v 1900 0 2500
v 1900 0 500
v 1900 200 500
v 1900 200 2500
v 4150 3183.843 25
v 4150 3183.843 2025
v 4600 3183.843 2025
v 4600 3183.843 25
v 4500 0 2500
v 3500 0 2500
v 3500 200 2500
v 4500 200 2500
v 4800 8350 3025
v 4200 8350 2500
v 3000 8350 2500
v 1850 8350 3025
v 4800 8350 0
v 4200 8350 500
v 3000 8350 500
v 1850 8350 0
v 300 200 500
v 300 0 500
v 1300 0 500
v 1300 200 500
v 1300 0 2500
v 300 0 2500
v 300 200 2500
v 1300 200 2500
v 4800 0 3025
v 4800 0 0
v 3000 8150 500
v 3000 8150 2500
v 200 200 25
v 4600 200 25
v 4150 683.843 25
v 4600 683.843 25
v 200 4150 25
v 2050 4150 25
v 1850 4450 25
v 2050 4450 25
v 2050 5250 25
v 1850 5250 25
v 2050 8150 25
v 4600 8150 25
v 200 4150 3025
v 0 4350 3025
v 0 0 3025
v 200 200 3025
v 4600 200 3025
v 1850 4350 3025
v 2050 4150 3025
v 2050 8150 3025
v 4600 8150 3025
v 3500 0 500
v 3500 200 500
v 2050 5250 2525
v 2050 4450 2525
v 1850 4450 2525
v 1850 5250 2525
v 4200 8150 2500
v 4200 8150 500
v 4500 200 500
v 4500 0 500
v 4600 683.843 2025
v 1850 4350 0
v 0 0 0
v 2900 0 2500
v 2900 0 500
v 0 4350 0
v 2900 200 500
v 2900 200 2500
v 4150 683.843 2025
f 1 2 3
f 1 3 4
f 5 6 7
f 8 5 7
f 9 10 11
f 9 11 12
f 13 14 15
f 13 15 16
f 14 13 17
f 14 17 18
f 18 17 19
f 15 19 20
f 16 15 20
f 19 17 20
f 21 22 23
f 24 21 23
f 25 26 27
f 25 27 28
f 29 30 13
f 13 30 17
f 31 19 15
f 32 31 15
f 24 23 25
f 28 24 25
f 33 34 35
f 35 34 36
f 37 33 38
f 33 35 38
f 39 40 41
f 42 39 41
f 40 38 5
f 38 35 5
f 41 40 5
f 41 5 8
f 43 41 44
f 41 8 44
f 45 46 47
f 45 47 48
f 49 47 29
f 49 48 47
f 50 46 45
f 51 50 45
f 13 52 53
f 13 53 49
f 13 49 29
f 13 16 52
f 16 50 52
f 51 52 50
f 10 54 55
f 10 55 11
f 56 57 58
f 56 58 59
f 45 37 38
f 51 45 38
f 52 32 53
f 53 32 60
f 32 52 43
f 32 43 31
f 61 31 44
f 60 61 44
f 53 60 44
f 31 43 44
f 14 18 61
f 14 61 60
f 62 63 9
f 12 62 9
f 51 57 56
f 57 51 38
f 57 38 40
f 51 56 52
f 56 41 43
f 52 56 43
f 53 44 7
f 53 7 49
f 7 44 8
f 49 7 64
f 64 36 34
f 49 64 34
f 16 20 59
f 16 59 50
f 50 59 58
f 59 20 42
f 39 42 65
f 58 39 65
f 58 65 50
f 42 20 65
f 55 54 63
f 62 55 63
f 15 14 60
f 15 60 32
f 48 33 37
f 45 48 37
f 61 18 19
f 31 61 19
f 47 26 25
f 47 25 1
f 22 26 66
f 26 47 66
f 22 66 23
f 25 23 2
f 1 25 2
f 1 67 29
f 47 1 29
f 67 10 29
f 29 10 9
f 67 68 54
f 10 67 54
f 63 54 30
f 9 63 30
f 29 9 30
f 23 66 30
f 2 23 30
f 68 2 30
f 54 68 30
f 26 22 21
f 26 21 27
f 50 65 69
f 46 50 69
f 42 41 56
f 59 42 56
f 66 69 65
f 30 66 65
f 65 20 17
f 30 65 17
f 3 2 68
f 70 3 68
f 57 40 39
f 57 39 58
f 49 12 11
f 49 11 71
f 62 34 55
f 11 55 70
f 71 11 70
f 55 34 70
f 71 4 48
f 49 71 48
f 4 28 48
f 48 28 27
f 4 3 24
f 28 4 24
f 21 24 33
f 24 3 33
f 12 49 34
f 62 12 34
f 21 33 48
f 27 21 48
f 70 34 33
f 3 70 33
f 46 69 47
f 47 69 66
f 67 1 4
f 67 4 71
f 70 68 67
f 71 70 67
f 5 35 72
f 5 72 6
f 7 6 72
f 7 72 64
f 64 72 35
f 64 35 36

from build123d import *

# Parameters (mm, degrees)
F1_DEPTH  = 25
F4_DEPTH  = 3000
F5_W      = 1000
F5_H      = 2000
F6_DEPTH  = 200
F7_W      = 1200
F7_H      = 2000
F8_DEPTH  = 200
F9_W      = 800
F9_H      = 2500
F10_DEPTH = 200
F11_W     = 450
F11_H     = 2500
F12_DEPTH = 2000


with BuildPart() as f1:
    # F0 (on Top) → F1 (new body)
    with BuildSketch(Plane.XY):
        Polygon((0, 4350), (0, 0), (4800, 0), (4800, 8350), (1850, 8350), (1850, 4350), align=None)
    extrude(amount=F1_DEPTH)

    # F3 (on face) → F4 (join)
    with BuildSketch(Plane.XY.offset(25)):
        Polygon((0, 0), (4800, 0), (4800, 8350), (1850, 8350), (1850, 4350), (0, 4350), align=None)
        Polygon((4600, 8150), (4600, 200), (200, 200), (200, 4150), (2050, 4150), (2050, 8150), align=None, mode=Mode.SUBTRACT)
    extrude(amount=F4_DEPTH)

    # F5 (on face) → F6 (cut, through all)
    with BuildSketch(Plane.XZ):
        with Locations((800, 1500)):
            Rectangle(F5_W, F5_H)
        with Locations((2400, 1500)):
            Rectangle(F5_W, F5_H)
        with Locations((4000, 1500)):
            Rectangle(F5_W, F5_H)
    extrude(amount=-F6_DEPTH, mode=Mode.SUBTRACT)

    # F7 (on face) → F8 (cut, through all)
    with BuildSketch(Plane(origin=(0, 8350, 0), x_dir=(-1, 0, 0), z_dir=(0, 1, 0))):
        with Locations((-3600, 1500)):
            Rectangle(F7_W, F7_H)
    extrude(amount=-F8_DEPTH, mode=Mode.SUBTRACT)

    # F9 (on face) → F10 (cut, through all)
    with BuildSketch(Plane.YZ.offset(2050)):
        with Locations((4850, 1275)):
            Rectangle(F9_W, F9_H)
    extrude(amount=-F10_DEPTH, mode=Mode.SUBTRACT)

    # F11 (on face) → F12 (join)
    with BuildSketch(Plane.XY.offset(25)):
        with Locations((4375, 1933.843195)):
            Rectangle(F11_W, F11_H)
    extrude(amount=F12_DEPTH)


solid = f1.part
